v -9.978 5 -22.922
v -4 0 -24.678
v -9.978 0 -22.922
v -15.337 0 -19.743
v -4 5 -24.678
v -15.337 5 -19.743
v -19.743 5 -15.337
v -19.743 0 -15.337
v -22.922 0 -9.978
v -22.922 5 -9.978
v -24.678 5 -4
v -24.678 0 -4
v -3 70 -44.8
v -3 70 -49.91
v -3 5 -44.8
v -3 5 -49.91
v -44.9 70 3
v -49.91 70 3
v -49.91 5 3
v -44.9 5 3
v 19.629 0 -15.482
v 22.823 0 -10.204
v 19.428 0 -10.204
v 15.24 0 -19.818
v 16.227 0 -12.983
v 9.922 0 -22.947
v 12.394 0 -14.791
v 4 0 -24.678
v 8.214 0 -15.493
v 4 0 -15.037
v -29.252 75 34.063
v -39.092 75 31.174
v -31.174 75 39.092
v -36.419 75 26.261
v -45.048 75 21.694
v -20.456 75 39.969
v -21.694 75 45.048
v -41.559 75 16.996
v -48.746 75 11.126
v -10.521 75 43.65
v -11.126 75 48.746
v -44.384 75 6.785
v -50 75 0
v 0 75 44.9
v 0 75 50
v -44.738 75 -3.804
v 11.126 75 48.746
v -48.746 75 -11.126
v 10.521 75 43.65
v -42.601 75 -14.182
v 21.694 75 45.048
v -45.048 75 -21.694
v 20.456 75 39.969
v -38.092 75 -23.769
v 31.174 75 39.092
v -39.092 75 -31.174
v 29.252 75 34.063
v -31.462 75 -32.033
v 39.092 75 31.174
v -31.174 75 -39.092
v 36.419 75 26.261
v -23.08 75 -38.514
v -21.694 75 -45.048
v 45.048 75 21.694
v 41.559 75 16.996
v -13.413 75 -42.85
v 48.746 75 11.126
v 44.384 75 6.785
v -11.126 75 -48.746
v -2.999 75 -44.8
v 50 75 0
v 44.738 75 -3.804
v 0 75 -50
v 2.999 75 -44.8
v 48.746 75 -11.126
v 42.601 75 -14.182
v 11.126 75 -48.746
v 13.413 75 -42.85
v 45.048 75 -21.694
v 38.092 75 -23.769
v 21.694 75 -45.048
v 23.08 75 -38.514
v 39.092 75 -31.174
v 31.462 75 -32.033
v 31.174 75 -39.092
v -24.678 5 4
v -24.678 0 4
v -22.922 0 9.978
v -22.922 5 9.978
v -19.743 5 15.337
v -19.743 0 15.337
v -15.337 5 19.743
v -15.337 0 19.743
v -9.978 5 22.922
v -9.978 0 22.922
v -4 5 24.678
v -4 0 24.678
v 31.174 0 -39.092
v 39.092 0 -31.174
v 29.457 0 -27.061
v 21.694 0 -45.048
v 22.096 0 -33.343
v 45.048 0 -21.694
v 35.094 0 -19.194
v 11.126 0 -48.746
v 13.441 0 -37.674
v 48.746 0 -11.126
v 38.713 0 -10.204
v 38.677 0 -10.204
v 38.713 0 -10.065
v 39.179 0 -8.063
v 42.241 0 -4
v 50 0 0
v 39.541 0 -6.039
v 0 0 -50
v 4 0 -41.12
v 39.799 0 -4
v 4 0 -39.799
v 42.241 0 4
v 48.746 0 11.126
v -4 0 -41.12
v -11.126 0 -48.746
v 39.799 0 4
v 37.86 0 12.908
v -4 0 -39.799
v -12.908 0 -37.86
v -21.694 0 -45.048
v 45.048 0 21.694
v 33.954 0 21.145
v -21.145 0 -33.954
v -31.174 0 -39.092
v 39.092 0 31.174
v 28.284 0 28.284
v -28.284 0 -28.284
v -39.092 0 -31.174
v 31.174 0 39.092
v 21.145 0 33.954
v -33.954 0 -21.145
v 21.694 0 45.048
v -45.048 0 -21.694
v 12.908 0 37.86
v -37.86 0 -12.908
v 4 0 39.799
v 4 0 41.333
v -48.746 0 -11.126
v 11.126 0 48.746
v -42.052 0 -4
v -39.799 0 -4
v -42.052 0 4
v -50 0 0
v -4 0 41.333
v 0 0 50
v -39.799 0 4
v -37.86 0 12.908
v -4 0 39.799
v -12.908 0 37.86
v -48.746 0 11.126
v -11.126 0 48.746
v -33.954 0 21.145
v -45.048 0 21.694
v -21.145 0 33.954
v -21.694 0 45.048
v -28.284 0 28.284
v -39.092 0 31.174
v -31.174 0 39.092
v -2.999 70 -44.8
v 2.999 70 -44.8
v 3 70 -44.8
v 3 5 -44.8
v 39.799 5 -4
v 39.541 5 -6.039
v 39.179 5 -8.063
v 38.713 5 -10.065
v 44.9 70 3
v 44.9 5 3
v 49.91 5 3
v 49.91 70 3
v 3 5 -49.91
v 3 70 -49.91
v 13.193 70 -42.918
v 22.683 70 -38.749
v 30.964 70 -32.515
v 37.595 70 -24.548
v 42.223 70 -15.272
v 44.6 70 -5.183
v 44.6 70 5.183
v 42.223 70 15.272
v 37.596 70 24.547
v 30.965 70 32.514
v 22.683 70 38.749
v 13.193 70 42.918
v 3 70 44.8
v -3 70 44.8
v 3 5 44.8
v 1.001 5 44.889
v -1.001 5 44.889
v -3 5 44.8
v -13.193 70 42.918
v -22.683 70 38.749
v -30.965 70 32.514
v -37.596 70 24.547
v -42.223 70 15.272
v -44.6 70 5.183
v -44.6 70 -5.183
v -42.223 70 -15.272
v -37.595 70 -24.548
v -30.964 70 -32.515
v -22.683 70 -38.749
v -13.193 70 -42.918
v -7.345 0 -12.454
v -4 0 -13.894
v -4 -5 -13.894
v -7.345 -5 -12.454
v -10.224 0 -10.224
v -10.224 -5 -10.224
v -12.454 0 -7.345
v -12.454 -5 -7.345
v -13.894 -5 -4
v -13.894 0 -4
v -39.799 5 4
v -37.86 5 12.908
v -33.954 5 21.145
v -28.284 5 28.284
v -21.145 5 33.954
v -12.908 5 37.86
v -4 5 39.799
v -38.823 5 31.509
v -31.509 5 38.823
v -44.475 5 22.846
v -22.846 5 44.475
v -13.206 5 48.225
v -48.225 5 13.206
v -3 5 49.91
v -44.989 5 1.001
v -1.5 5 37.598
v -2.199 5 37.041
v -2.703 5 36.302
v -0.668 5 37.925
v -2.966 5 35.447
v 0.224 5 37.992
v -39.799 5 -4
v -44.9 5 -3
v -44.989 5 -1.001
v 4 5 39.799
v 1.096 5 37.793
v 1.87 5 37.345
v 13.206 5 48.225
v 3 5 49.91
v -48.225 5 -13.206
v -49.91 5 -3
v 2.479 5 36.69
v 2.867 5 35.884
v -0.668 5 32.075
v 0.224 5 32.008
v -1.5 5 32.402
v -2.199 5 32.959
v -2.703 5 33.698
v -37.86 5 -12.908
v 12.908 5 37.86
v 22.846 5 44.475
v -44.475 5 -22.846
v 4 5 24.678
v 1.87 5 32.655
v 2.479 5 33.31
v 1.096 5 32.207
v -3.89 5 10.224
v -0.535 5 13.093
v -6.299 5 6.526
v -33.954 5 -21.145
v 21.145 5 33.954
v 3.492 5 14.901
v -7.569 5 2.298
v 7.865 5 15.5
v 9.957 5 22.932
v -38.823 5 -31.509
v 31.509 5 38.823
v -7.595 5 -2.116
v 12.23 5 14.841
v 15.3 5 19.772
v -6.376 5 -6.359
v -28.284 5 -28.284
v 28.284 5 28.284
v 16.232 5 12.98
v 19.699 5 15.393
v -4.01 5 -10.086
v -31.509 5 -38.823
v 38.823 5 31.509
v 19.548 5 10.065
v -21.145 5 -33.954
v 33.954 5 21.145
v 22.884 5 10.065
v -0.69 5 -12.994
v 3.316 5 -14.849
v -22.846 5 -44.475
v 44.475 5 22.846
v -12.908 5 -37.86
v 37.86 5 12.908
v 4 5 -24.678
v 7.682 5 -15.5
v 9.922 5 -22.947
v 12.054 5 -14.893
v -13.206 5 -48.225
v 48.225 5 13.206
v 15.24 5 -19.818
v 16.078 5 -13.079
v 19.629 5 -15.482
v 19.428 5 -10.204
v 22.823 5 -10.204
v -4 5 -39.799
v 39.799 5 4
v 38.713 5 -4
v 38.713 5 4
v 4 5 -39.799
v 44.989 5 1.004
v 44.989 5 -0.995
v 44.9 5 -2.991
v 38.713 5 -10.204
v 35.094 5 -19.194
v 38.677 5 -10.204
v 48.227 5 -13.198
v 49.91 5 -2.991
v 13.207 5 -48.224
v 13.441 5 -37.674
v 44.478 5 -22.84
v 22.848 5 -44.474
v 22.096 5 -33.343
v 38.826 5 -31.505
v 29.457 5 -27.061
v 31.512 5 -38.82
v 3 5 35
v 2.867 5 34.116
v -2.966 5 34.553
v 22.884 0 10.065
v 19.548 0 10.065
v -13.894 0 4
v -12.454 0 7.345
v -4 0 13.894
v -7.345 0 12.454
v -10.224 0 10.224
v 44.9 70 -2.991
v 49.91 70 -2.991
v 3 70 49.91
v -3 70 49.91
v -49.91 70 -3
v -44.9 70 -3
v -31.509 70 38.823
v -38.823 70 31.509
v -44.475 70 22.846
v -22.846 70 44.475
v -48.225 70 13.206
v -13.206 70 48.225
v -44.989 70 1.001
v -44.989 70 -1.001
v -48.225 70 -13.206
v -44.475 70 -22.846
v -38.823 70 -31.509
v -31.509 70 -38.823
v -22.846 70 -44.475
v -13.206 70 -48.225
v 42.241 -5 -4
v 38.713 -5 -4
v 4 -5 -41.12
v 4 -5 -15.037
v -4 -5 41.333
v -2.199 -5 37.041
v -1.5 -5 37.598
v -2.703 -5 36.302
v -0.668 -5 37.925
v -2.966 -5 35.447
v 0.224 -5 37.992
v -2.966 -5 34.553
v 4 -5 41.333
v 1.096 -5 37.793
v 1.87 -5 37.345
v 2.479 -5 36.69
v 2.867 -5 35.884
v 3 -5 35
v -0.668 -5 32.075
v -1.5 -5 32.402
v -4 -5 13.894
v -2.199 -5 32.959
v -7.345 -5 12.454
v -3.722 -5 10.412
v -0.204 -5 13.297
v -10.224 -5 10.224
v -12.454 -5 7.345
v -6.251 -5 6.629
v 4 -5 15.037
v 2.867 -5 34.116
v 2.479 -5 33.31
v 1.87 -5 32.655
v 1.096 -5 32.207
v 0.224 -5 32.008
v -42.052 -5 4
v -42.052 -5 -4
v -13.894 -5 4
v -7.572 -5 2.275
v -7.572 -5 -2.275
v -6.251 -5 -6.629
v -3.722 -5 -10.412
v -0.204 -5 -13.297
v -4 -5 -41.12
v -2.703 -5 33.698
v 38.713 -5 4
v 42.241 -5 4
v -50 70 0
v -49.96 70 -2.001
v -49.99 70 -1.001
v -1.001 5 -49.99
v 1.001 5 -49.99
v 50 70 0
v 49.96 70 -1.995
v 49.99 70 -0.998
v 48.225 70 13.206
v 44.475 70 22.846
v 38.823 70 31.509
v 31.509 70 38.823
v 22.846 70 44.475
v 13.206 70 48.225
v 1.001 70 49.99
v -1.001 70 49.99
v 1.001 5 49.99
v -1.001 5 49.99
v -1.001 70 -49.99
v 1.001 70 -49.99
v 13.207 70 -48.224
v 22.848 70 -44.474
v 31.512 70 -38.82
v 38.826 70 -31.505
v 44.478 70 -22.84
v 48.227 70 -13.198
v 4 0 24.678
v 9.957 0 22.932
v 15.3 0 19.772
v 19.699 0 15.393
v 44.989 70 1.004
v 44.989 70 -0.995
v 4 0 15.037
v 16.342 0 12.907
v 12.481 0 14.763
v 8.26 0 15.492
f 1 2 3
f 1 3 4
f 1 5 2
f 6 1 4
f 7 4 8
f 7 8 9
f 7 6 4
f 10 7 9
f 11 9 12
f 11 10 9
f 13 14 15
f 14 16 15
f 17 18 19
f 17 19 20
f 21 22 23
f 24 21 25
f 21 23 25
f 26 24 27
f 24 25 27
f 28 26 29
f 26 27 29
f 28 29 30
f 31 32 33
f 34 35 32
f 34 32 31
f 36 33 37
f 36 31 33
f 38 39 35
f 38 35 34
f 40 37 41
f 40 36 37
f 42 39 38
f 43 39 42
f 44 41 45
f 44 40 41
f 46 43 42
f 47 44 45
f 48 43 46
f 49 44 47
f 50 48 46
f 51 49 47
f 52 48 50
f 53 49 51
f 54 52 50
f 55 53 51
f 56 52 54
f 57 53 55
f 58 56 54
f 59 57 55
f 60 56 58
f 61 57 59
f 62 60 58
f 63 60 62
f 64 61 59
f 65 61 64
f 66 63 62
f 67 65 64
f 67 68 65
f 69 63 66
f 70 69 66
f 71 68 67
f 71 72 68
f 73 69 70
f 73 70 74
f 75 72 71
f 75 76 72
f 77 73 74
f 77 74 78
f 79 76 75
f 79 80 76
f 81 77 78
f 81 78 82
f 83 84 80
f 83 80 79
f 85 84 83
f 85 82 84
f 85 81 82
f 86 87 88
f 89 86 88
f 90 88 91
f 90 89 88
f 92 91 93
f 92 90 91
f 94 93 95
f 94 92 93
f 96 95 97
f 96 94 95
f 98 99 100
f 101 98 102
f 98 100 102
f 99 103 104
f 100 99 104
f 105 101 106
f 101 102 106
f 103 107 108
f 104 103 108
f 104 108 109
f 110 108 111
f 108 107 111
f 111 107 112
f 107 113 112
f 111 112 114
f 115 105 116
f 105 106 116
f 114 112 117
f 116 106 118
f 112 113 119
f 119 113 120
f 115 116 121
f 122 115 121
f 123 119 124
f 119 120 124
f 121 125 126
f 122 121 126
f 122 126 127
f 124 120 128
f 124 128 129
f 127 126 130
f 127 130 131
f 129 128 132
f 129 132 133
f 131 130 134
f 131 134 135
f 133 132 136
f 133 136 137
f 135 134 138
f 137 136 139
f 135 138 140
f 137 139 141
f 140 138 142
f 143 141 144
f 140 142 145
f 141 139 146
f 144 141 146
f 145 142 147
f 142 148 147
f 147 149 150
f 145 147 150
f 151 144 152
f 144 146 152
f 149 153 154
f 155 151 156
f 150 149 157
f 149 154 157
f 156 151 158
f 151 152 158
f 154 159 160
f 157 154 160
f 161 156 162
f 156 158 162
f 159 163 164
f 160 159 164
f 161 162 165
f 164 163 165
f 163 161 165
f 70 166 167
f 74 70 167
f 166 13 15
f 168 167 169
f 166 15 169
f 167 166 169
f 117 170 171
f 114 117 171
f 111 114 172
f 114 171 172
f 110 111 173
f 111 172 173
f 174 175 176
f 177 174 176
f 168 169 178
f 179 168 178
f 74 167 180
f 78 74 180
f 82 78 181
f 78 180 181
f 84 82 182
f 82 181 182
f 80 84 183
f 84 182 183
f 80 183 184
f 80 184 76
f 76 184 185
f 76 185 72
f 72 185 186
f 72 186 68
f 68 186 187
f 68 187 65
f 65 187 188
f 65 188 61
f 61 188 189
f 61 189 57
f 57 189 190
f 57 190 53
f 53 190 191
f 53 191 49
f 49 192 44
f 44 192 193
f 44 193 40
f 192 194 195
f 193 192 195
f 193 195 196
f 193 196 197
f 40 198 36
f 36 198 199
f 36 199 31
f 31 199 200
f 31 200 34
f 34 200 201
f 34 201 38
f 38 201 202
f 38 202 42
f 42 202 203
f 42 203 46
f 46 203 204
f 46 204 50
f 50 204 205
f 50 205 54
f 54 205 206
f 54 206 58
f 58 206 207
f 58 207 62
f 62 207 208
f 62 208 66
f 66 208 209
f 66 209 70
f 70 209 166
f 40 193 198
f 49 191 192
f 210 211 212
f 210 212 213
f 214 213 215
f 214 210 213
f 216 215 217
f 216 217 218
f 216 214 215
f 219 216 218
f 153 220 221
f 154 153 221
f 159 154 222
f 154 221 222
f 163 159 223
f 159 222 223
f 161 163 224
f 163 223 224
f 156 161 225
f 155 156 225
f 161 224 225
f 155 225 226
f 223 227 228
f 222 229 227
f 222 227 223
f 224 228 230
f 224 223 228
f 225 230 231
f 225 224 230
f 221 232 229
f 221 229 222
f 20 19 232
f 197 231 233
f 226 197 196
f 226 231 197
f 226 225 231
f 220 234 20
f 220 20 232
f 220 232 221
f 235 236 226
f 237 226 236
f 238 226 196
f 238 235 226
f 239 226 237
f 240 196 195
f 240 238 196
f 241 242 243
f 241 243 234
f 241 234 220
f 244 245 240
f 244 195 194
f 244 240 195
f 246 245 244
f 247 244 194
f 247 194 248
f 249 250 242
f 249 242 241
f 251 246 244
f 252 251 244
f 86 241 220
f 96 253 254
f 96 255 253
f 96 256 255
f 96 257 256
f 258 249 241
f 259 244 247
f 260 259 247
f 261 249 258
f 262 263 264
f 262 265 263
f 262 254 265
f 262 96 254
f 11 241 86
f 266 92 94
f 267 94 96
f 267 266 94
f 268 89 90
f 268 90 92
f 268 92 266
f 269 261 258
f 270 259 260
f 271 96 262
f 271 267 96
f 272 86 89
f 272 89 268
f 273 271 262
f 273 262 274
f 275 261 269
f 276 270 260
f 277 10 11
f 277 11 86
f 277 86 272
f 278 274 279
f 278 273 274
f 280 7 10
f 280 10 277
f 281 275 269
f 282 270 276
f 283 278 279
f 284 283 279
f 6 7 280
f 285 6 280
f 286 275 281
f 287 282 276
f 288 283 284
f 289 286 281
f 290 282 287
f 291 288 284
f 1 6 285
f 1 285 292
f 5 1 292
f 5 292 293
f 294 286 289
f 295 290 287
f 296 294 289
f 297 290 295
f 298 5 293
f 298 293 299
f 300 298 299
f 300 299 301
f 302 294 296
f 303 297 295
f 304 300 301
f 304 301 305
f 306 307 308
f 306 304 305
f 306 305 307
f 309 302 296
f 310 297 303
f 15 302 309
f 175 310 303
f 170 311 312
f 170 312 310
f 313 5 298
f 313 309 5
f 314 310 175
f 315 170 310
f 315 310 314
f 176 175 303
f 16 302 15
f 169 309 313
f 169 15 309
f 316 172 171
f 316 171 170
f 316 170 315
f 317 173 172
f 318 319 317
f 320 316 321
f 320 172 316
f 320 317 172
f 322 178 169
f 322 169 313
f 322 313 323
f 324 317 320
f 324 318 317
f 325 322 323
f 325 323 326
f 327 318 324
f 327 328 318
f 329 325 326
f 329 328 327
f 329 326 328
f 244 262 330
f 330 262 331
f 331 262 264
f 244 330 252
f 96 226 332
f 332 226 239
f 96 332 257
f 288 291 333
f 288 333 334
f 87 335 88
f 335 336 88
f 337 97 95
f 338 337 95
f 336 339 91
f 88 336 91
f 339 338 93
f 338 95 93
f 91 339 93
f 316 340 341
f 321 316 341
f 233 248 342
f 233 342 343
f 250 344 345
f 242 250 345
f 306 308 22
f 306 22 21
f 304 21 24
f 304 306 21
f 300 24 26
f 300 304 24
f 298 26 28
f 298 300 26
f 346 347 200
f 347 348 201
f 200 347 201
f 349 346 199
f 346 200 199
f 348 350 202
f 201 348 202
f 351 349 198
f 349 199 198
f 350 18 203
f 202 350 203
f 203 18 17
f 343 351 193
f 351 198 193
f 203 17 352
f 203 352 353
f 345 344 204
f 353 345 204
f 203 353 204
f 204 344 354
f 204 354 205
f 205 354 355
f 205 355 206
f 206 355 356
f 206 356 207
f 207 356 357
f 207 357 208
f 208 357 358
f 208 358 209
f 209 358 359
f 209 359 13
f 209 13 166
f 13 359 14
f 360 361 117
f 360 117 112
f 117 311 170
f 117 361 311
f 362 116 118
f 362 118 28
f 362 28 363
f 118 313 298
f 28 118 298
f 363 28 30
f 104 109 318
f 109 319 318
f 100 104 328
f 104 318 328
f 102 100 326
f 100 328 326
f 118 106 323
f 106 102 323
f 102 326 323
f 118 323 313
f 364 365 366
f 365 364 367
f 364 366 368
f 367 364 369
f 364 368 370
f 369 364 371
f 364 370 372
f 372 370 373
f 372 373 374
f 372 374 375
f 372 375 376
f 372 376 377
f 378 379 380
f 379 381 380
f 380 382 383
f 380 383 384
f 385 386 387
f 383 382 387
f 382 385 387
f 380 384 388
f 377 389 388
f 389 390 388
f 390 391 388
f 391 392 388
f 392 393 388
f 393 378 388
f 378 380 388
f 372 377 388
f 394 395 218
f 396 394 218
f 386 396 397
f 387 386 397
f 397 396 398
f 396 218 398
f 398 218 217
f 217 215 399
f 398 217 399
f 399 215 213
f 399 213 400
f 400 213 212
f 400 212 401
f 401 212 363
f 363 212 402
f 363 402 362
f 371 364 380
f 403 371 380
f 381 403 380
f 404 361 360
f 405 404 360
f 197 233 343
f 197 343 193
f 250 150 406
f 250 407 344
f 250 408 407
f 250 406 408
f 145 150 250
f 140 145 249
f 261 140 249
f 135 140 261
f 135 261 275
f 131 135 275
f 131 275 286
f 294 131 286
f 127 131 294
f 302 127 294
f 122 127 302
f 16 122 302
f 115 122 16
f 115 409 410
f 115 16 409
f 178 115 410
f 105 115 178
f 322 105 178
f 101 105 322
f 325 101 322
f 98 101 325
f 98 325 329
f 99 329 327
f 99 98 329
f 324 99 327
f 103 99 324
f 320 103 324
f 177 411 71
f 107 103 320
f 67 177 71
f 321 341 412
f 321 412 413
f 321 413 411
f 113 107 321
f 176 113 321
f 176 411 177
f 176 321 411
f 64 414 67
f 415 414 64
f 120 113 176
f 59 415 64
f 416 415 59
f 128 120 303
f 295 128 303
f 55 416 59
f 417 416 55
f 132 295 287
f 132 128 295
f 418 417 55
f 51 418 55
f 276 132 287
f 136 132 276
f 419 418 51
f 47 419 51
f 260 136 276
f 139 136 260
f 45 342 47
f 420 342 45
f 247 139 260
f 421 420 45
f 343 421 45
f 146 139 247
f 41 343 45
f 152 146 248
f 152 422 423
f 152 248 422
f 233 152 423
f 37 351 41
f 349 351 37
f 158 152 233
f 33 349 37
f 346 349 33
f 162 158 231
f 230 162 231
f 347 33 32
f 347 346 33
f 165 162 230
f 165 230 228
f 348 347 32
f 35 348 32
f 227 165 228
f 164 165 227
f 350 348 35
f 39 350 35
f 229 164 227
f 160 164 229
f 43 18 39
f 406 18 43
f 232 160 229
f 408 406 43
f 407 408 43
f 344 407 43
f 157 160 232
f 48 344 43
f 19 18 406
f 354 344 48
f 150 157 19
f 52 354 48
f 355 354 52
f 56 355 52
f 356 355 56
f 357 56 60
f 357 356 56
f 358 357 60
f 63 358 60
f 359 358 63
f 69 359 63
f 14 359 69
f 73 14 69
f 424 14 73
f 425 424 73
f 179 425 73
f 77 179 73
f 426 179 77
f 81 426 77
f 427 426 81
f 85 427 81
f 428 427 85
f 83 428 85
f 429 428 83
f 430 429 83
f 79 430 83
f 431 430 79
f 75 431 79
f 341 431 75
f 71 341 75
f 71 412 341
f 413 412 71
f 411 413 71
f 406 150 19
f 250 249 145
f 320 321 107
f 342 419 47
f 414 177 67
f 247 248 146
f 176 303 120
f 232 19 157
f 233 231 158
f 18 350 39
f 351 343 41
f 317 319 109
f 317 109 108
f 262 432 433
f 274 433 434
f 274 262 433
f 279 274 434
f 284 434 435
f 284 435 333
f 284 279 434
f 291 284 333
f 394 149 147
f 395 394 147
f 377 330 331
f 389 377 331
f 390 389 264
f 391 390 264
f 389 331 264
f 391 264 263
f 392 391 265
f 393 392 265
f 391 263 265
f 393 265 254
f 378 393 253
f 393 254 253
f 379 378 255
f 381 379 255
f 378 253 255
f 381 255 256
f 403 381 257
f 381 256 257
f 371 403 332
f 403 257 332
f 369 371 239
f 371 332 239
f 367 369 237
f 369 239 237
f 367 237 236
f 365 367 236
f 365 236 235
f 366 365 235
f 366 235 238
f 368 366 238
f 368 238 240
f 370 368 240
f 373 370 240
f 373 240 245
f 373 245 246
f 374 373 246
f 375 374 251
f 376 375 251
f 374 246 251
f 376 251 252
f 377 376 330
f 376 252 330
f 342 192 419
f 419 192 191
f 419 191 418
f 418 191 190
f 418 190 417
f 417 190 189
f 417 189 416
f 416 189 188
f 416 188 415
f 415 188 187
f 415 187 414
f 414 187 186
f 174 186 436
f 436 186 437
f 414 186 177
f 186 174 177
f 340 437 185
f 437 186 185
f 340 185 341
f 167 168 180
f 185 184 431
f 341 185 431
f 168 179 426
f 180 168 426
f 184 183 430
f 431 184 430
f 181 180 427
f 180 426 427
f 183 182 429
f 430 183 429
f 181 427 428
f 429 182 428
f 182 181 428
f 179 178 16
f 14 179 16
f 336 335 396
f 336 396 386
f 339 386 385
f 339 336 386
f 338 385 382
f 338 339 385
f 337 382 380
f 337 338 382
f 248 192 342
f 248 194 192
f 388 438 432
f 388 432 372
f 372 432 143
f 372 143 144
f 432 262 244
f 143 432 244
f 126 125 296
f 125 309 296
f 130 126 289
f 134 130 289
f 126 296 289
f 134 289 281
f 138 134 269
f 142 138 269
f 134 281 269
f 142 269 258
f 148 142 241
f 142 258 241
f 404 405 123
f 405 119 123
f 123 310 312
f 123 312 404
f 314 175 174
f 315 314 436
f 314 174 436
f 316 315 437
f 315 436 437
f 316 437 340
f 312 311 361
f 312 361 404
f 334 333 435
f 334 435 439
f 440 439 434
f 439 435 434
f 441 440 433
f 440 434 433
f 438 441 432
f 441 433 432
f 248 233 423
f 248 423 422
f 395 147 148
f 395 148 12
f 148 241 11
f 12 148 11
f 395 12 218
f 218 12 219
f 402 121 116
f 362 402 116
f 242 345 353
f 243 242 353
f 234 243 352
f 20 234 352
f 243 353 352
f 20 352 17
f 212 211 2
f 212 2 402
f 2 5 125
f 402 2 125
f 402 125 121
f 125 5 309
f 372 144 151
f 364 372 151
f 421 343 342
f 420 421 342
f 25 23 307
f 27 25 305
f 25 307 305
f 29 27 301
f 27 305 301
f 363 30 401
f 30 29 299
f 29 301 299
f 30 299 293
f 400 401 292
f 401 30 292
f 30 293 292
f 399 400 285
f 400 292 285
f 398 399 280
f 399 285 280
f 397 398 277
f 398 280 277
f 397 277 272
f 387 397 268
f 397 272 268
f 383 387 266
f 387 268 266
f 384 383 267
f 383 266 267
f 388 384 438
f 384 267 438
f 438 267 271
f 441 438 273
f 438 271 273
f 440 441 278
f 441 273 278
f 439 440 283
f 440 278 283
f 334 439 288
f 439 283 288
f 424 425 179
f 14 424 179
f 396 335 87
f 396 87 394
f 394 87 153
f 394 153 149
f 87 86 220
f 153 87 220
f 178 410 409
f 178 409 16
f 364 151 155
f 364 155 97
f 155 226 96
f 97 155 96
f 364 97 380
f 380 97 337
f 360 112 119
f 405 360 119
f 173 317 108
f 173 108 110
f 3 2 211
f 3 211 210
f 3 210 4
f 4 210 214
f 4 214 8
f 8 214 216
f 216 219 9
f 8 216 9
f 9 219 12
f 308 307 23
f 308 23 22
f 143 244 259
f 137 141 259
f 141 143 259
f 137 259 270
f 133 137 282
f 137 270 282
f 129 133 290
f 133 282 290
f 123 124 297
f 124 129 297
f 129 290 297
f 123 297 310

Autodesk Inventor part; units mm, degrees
ref_plane "YZ Plane" through (0, 0, 0) normal (1, 0, 0) x (0, 1, 0)
ref_plane "XZ Plane" through (0, 0, 0) normal (0, 1, 0) x (-1, 0, 0)
ref_plane "XY Plane" through (0, 0, 0) normal (0, 0, 1) x (1, 0, 0)
sketch "Szkic1" plane through (0, 0, 0) normal (0, 1, 0) x (-1, 0, 0)
  circle A0 centre (0, 0) radius 50
  dimension "d0" = 100
extrude "Wyciągnięcie proste1" add sketch "Szkic1" along normal blind 80
sketch "Szkic2" plane through (0, 80, 0) normal (0, 1, 0) x (1, 0, 0)
  circle A0 centre (0, 0) radius 45
  dimension "d3" = 90
extrude "Wyciągnięcie proste2" cut sketch "Szkic2" against normal blind 75
sketch "Szkic3" plane through (0, 5, 0) normal (0, 1, 0) x (1, 0, 0)
  point P0 (0, 0)
sketch "Szkic4" plane through (0, 5, 0) normal (0, 1, 0) x (1, 0, 0)
  circle A0 centre (0, 0) radius 7.5
  dimension "d6" = 15
extrude "Wyciągnięcie proste3" cut sketch "Szkic4" against normal blind 75
sketch "Szkic9" plane through (0, 80, 0) normal (0, 1, 0) x (1, 0, 0)
  circle A0 centre (0, 0) radius 50 projected
  line L0 (-49.9099, 3) -> (-44.8999, 3)
  circle A1 centre (0, 0) radius 45 projected
  line L1 (-49.9099, -3) -> (-44.8999, -3)
  line L2 (44.9005, 2.9912) -> (49.9104, 2.9912)
  line L3 (44.6345, -3) -> (49.9099, -3)
  arc A2 (-49.9099, -3) -> (49.9099, -3) centre (0, 0) ccw
  arc A3 (-40.5012, -19.6125) -> (44.6345, -3) centre (-0.1275, -0.0618) ccw
  arc A4 (49.9104, 2.9912) -> (-49.9099, 3) centre (0, 0) ccw
  arc A5 (44.9005, 2.9912) -> (-44.8999, 3) centre (-0.0001, -0.7186) ccw
  point P0 (44.9005, 2.9912)
  point P1 (44.8999, -3)
extrude "Wyciągnięcie proste4" cut sketch "Szkic9" against normal blind 75 contours L2 A1 L0 A0 | A0 L1 A1 L3 | A5 A1 | A1 L3 A3 A5 | A1 A3 L3
sketch "Szkic10" plane through (0, 80, 0) normal (0, 1, 0) x (1, 0, 0)
  circle A0 centre (0, 0) radius 50
  arc A1 (44.8999, -3) -> (44.9005, 2.9912) centre (0, 0) ccw projected
  circle A2 centre (0, 0) radius 45
  point P0 (44.9005, 2.9912)
extrude "Wyciągnięcie proste5" cut sketch "Szkic10" against normal blind 10
sketch "Szkic11" plane through (0, 70, 0) normal (0, 1, 0) x (1, 0, 0)
  circle A0 centre (0, 0) radius 7.5 projected
  circle A1 centre (0, 0) radius 50
  circle A2 centre (0, 0) radius 44.8999
extrude "Wyciągnięcie proste6" add sketch "Szkic11" along normal blind 5 contours A1
sketch "Szkic12" plane through (0, 5, 0) normal (0, 1, 0) x (1, 0, 0)
  circle A0 centre (0, 0) radius 44.8999 projected
  circle A1 centre (0, 0) radius 50 projected
  line L0 (-3, -44.7996) -> (3, -44.7996)
  line L1 (3, -44.7996) -> (3, -49.9099)
  line L2 (3, -49.9099) -> (-3, -49.9099)
  line L3 (-3, -49.9099) -> (-3, -44.7996)
  dimension "d20" = 6
extrude "Wyciągnięcie proste7" add sketch "Szkic12" along normal blind 70 contours A0 L1 L2 L3
sketch "Szkic13" plane through (0, 5, 0) normal (0, 1, 0) x (1, 0, 0)
  arc A0 (3, -44.7996) -> (-3, -44.7996) centre (0, 0) ccw projected
  arc A1 (49.9104, 2.9912) -> (-49.9099, 3) centre (0, 0) ccw projected
  line L0 (-3, 44.7996) -> (3, 44.7996)
  line L1 (3, 44.7996) -> (3, 49.9099)
  line L2 (3, 49.9099) -> (-3, 49.9099)
  line L3 (-3, 49.9099) -> (-3, 44.7996)
  dimension "d23" = 6
extrude "Wyciągnięcie proste8" add sketch "Szkic13" along normal blind 70 contours L0 A0 | A0 L3 L2 L1
sketch "Szkic14" plane through (0, 5, 0) normal (0, 1, 0) x (1, 0, 0)
  circle A0 centre (0, 0) radius 7.5 projected
  circle A1 centre (0, 0) radius 25
  circle A2 centre (0, 0) radius 40
  dimension "d26" = 50
  dimension "d27" = 80
extrude "Wyciągnięcie proste9" cut sketch "Szkic14" against normal blind 70 contours A2
sketch "Szkic15" plane through (0, 5, 0) normal (0, 1, 0) x (1, 0, 0)
  line L0 (-4, 41.1196) -> (4, 41.1196)
  line L1 (4, 41.1196) -> (4, -41.3332)
  line L2 (4, -41.3332) -> (-4, -41.3332)
  line L3 (-4, -41.3332) -> (-4, 41.1196)
  point P0 (0, 0)
  dimension "d30" = 8
extrude "Wyciągnięcie proste10" add sketch "Szkic15" against normal blind 10
sketch "Szkic16" plane through (0, 5, 0) normal (0, 1, 0) x (1, 0, 0)
  line L0 (-42.0523, 4) -> (42.2413, 4)
  line L1 (42.2413, 4) -> (42.2413, -4)
  line L2 (42.2413, -4) -> (-42.0523, -4)
  line L3 (-42.0523, -4) -> (-42.0523, 4)
  point P0 (0, 0)
  dimension "d33" = 8
extrude "Wyciągnięcie proste11" add sketch "Szkic16" against normal blind 10
sketch "Szkic17" plane through (0, 5, 0) normal (0, 1, 0) x (1, 0, 0)
  circle A0 centre (0, 0) radius 14.4584
extrude "Wyciągnięcie proste12" add sketch "Szkic17" against normal blind 10
sketch "Szkic18" plane through (0, 5, 0) normal (0, 1, 0) x (1, 0, 0)
  circle A0 centre (0, -35) radius 3
  point P0 (0, 0)
  dimension "d38" = 6
extrude "Wyciągnięcie proste13" cut sketch "Szkic18" against normal blind 15
sketch "Szkic22" plane through (0, 5, 0) normal (0, 1, 0) x (1, 0, 0)
  circle A0 centre (7.7599, 0) radius 15.5
  line L0 (24.6779, -4) -> (39.7995, -4) projected
  arc A1 (4, -39.7995) -> (39.7995, -4) centre (0, 0) ccw projected
  line L1 (38.713, -10.0649) -> (14.3625, -10.0649)
  line L2 (14.3625, -10.0649) -> (14.3625, 10.2037)
  line L3 (14.3625, 10.2037) -> (38.713, 10.2037)
  line L4 (38.713, 10.2037) -> (38.713, -10.0649)
  point P0 (19.4275, 10.2037)
  point P1 (19.5474, -10.0649)
  dimension "d50" = 31
extrude "Wyciągnięcie proste17" cut sketch "Szkic22" against normal blind 10 contours A0 L1 L2 L3 | A0 L3 L4 L1 | L3 L2 L1 A0
properties part number "Walec2"
